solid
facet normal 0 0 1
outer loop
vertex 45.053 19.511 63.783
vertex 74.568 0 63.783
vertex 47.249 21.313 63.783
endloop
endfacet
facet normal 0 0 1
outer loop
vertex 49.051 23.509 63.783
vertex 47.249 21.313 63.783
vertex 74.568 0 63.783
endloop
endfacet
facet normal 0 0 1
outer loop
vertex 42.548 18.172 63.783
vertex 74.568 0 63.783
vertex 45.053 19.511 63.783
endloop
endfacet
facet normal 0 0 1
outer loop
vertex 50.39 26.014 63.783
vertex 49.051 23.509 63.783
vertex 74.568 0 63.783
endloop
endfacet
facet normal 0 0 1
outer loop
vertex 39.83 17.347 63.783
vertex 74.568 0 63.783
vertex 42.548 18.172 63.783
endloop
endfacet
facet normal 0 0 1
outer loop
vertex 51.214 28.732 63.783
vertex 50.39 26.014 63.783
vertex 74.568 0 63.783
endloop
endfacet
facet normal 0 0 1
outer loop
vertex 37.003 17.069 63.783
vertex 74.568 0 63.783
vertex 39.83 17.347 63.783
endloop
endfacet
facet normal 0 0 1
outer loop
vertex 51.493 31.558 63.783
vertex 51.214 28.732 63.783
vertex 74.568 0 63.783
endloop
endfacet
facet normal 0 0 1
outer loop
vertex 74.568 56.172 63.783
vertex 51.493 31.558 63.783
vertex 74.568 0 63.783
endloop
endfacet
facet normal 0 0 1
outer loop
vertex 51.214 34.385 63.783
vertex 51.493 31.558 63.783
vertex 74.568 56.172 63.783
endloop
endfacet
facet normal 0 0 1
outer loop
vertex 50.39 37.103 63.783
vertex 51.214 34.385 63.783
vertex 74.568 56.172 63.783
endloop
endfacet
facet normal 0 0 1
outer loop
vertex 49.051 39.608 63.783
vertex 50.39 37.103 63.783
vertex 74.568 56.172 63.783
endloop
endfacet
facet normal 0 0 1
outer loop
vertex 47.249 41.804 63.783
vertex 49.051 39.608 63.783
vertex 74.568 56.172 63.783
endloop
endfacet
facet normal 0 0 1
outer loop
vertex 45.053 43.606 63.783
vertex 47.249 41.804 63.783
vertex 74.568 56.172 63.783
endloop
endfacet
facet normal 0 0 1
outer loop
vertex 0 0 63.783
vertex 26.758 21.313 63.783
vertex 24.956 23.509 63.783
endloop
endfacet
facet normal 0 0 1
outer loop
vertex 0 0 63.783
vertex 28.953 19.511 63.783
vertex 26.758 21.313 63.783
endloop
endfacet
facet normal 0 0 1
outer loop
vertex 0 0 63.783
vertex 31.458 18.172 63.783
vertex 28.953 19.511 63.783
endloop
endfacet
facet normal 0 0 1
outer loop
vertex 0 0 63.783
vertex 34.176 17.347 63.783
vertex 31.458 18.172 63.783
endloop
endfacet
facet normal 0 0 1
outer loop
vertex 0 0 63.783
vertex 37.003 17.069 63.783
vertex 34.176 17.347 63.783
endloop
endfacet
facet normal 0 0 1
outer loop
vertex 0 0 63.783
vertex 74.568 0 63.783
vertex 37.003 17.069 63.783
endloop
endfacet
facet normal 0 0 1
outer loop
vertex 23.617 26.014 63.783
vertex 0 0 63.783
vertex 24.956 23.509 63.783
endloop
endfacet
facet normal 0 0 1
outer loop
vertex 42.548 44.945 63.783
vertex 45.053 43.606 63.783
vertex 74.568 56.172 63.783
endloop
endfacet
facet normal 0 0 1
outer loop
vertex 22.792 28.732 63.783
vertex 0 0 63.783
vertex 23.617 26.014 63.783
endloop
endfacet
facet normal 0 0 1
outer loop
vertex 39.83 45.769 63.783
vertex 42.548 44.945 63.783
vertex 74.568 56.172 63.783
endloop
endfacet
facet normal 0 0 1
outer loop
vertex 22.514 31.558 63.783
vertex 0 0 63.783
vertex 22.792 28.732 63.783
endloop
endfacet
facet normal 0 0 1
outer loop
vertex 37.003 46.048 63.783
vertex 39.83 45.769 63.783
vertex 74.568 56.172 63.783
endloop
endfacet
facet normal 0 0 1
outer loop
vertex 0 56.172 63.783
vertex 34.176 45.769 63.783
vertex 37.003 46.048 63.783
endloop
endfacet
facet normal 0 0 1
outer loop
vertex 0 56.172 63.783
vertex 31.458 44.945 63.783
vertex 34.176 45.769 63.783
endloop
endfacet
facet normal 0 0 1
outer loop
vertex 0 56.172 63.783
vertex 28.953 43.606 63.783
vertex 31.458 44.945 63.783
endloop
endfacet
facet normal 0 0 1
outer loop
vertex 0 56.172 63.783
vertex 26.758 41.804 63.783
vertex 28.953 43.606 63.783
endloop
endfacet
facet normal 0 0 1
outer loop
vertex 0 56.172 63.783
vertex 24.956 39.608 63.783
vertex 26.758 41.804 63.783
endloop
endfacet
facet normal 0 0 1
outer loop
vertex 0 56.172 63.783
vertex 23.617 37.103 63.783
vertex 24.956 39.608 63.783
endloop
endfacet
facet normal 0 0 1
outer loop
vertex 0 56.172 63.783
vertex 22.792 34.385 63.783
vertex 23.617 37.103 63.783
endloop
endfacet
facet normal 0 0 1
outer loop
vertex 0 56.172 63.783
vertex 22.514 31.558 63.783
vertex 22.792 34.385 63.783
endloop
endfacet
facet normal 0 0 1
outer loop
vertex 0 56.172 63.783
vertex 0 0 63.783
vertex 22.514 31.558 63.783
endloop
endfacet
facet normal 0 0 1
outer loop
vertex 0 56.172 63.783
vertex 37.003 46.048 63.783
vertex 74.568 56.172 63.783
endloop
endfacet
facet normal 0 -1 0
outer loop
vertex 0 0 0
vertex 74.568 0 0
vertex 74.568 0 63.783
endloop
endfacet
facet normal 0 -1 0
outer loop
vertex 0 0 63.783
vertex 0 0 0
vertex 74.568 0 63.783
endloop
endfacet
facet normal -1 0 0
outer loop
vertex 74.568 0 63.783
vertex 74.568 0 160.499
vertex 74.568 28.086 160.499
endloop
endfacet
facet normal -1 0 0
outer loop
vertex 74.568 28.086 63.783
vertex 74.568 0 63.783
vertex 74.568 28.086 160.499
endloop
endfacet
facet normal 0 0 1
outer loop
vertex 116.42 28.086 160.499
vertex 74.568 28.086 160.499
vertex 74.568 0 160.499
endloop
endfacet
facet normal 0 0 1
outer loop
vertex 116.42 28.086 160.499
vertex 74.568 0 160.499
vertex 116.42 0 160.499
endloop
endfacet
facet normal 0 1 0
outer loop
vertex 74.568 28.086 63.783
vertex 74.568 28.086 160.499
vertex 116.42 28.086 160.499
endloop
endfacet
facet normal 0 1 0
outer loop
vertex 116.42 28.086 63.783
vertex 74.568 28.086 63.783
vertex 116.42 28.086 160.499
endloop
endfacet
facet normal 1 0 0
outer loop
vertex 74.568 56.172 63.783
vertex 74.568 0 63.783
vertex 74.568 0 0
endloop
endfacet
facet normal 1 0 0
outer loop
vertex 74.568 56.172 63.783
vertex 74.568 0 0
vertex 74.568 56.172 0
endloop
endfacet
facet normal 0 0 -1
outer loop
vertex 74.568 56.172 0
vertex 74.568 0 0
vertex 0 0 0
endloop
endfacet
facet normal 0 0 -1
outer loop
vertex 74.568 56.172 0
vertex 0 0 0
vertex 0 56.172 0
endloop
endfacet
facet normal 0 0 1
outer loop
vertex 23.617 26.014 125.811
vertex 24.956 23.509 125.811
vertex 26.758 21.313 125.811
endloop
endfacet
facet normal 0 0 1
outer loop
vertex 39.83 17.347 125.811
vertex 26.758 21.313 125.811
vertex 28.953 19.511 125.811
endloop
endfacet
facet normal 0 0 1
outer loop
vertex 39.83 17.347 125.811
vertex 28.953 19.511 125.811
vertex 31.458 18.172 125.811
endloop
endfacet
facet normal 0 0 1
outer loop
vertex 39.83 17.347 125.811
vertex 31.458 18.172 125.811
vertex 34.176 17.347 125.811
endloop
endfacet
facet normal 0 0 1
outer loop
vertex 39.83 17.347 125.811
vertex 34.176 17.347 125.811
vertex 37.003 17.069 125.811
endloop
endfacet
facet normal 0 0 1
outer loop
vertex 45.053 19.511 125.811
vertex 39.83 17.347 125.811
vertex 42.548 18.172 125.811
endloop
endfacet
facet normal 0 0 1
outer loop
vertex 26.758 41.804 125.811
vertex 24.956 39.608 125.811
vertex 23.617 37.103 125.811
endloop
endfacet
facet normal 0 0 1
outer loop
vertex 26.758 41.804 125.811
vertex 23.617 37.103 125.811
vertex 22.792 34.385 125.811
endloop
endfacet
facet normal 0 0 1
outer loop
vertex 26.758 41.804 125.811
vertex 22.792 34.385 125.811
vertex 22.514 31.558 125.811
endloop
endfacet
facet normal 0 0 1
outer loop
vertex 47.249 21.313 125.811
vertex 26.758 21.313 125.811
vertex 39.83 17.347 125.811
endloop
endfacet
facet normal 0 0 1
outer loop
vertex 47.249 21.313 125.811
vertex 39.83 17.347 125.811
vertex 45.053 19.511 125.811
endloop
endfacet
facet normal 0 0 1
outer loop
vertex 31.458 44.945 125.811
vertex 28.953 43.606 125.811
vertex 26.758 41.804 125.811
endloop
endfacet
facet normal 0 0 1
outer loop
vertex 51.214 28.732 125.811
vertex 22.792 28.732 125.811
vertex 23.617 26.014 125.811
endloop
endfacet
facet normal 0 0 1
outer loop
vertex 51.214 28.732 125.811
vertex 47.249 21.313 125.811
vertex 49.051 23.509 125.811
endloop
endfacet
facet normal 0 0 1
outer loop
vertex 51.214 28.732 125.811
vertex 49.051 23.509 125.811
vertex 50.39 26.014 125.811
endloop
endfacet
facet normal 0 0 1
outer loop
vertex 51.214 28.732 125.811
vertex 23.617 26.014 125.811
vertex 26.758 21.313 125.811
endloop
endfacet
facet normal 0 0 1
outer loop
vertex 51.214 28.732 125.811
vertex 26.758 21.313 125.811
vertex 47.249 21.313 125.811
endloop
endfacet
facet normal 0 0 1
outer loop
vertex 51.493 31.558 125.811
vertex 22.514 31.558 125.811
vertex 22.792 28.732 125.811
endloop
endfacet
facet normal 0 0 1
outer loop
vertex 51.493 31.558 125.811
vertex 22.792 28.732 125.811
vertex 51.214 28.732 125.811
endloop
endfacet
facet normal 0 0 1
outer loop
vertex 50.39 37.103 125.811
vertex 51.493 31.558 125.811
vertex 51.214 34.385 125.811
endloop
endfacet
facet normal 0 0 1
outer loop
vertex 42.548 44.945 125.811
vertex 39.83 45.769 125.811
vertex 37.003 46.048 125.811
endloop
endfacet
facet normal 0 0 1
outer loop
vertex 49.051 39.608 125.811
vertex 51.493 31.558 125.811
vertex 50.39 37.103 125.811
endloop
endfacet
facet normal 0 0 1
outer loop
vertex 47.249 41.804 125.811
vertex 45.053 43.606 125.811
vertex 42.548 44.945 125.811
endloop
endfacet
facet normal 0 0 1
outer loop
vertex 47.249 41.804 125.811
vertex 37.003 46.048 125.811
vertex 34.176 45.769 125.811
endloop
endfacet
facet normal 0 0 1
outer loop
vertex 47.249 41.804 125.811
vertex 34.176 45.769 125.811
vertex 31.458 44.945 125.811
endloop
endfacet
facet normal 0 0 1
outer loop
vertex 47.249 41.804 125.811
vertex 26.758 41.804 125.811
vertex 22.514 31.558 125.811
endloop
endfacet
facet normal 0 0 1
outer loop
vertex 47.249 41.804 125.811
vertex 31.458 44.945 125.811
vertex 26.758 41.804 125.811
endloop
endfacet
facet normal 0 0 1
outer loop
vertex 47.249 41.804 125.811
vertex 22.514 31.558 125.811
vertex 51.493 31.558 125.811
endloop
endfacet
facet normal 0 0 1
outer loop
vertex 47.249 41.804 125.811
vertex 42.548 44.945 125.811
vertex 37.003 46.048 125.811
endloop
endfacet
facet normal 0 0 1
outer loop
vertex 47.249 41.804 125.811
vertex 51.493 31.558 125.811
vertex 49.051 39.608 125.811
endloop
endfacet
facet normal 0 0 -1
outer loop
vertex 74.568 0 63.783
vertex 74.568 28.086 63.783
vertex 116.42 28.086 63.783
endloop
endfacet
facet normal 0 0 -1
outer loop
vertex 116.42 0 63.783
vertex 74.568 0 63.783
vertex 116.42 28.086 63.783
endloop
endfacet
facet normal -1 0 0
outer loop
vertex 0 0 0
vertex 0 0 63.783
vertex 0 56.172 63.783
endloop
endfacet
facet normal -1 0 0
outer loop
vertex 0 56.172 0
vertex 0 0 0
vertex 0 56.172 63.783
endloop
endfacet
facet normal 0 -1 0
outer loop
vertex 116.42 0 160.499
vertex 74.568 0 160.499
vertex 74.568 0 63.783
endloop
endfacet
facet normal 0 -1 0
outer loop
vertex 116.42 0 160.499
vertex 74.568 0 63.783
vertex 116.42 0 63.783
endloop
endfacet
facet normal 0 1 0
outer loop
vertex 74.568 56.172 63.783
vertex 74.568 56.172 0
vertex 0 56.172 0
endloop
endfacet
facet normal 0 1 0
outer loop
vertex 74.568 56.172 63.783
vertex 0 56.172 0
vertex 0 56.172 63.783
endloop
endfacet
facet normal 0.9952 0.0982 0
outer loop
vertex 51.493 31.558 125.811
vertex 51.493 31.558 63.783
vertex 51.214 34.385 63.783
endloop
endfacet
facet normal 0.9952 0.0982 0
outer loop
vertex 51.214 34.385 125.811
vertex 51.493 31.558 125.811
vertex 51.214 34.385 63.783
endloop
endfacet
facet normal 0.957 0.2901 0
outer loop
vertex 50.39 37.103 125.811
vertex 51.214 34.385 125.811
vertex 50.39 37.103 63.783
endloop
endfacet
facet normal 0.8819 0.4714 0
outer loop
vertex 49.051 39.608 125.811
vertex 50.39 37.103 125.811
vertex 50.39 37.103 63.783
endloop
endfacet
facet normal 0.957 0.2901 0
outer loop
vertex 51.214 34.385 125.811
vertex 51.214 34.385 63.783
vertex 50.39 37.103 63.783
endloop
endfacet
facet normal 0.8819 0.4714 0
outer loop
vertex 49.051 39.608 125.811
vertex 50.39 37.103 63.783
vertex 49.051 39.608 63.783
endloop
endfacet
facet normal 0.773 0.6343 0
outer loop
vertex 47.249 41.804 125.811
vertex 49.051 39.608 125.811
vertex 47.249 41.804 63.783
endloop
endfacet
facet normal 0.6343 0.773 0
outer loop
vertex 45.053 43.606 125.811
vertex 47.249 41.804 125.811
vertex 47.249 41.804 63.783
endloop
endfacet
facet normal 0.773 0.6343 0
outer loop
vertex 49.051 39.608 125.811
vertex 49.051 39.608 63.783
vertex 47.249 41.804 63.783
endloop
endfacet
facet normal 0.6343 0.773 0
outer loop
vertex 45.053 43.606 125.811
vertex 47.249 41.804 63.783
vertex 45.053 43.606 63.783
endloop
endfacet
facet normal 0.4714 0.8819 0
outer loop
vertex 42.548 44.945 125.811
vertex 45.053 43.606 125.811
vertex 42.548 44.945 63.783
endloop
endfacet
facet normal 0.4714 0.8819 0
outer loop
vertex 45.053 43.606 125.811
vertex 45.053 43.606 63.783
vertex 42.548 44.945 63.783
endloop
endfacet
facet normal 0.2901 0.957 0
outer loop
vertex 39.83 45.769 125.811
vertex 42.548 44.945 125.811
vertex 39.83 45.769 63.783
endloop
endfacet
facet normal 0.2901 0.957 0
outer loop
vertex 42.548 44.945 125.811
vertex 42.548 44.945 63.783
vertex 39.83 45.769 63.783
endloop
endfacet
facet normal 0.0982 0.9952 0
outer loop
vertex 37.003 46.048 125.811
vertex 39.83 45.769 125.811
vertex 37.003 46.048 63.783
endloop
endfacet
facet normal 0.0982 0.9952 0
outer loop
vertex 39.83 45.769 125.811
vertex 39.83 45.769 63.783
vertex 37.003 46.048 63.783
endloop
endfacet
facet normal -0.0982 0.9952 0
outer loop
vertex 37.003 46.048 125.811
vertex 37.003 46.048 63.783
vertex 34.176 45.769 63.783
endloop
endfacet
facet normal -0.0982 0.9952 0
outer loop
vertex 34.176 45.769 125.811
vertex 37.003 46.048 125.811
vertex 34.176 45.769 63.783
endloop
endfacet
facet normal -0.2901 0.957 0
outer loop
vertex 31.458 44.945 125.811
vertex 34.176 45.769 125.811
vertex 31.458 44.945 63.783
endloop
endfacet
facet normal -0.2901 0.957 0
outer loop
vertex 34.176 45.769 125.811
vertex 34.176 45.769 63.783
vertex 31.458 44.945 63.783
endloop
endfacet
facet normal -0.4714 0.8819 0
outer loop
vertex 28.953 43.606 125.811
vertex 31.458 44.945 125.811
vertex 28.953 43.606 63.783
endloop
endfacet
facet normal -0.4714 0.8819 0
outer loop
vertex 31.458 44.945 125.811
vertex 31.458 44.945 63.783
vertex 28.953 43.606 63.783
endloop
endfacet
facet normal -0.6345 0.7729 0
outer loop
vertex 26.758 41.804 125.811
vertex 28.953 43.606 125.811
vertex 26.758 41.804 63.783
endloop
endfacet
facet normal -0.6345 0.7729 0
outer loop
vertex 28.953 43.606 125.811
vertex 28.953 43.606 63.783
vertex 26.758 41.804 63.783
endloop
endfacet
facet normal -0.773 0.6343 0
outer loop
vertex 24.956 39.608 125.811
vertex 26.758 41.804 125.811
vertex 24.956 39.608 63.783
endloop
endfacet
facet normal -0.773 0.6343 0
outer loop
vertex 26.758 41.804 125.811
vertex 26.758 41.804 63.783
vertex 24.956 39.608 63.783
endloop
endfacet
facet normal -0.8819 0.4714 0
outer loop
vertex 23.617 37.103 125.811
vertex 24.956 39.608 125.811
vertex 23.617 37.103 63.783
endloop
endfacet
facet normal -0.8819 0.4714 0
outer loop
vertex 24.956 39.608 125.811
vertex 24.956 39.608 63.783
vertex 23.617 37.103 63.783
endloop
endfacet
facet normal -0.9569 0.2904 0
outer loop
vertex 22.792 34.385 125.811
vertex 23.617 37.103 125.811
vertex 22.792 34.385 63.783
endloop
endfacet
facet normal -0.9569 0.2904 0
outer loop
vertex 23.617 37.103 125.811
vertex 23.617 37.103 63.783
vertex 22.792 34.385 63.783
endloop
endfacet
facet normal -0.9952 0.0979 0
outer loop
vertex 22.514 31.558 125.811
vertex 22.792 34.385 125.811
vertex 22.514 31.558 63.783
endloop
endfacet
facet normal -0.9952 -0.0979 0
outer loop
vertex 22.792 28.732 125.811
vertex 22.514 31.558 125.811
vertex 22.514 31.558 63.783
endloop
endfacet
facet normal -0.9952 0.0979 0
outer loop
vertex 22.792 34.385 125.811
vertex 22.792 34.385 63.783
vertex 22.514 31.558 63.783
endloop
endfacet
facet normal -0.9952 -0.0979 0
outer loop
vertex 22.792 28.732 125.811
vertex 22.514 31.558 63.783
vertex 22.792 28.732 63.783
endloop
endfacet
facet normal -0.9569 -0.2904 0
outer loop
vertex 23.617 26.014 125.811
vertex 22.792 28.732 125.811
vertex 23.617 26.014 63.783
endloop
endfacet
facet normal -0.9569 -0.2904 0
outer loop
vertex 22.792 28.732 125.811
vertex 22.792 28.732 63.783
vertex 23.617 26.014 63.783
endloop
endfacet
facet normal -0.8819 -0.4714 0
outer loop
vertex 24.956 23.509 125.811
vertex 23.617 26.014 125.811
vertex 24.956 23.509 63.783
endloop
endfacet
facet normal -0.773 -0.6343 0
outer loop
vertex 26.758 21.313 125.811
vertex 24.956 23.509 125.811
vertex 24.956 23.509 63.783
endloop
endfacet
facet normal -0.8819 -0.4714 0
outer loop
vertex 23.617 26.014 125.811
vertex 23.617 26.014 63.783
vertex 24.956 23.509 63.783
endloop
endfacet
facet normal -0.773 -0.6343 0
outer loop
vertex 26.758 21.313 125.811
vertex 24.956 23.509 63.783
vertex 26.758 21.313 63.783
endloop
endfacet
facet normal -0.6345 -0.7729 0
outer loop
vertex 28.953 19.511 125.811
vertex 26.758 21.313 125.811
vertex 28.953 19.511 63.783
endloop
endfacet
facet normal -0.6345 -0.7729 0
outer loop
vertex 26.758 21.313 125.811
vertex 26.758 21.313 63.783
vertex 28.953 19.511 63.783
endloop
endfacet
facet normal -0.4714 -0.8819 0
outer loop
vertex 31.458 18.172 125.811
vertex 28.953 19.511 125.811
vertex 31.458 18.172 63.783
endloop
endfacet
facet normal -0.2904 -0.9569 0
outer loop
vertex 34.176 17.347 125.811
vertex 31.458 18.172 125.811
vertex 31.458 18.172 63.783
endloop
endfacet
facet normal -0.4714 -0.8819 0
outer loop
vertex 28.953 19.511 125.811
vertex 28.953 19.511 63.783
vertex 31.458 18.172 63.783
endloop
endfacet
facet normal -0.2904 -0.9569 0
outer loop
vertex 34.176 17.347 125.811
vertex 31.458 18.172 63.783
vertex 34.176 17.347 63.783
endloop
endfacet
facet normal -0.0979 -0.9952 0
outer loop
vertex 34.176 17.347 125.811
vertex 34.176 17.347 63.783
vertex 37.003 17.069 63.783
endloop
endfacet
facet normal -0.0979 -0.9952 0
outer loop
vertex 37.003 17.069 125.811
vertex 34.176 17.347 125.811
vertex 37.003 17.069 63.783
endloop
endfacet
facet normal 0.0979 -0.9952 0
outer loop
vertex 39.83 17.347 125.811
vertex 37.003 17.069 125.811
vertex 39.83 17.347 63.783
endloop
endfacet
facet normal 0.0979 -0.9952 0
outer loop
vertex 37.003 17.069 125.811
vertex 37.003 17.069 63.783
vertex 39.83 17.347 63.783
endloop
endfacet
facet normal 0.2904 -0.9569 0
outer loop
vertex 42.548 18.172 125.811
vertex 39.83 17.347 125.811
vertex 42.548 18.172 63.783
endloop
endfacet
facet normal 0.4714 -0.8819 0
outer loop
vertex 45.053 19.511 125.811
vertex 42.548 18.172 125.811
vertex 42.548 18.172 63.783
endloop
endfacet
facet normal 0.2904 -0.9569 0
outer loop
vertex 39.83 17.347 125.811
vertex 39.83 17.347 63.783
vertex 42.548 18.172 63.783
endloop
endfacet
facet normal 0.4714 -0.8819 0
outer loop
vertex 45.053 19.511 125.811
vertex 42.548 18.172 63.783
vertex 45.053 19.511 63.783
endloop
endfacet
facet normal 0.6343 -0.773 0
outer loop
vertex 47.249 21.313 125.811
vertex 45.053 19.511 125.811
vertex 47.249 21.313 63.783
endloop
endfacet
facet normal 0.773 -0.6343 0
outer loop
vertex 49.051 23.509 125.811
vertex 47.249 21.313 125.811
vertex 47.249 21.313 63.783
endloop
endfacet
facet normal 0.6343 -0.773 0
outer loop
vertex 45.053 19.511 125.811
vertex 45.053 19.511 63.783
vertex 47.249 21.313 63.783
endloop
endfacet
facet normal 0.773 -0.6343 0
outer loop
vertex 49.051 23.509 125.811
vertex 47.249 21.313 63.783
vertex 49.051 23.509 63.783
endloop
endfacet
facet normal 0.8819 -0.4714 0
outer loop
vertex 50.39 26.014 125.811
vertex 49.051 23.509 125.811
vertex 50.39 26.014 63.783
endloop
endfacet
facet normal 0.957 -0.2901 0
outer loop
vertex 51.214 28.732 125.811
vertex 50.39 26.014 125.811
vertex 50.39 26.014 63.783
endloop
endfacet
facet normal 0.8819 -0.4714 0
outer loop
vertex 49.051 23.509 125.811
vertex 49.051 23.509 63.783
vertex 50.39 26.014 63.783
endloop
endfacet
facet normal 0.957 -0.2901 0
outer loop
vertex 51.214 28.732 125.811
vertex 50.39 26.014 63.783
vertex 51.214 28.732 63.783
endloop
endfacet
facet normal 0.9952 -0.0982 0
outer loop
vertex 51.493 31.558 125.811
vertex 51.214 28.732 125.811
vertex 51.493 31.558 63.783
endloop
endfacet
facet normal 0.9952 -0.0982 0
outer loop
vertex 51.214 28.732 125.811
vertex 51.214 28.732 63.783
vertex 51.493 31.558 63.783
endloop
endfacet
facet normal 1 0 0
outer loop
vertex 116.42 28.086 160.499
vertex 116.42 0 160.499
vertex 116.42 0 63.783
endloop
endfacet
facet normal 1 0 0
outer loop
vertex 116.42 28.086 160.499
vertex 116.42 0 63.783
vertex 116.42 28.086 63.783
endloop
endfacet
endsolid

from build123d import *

# Parameters (mm, degrees)
F0_W     = 56.171663
F0_H     = 63.783392
F1_DEPTH = 74.568413
F2_W     = 41.85196
F2_H     = 28.085832
F3_DEPTH = 96.715264
F4_R     = 14.489452
F5_DEPTH = 62.027216


with BuildPart() as f1:
    # F0 (on Right) → F1 (new body)
    with BuildSketch(Plane.YZ):
        with Locations((28.085831, 31.891696)):
            Rectangle(F0_W, F0_H)
    extrude(amount=F1_DEPTH)

    # F4 (on face) → F5 (join)
    with BuildSketch(Plane.XY.offset(63.783392)):
        with Locations((37.003137, 31.558447)):
            Circle(F4_R)
    extrude(amount=F5_DEPTH)


with BuildPart() as f3:
    # F2 (on face) → F3 (new body)
    with BuildSketch(Plane.XY.offset(63.783392)):
        with Locations((95.494393, 14.042916)):
            Rectangle(F2_W, F2_H)
    extrude(amount=F3_DEPTH)


solid = Compound([f1.part, f3.part])
